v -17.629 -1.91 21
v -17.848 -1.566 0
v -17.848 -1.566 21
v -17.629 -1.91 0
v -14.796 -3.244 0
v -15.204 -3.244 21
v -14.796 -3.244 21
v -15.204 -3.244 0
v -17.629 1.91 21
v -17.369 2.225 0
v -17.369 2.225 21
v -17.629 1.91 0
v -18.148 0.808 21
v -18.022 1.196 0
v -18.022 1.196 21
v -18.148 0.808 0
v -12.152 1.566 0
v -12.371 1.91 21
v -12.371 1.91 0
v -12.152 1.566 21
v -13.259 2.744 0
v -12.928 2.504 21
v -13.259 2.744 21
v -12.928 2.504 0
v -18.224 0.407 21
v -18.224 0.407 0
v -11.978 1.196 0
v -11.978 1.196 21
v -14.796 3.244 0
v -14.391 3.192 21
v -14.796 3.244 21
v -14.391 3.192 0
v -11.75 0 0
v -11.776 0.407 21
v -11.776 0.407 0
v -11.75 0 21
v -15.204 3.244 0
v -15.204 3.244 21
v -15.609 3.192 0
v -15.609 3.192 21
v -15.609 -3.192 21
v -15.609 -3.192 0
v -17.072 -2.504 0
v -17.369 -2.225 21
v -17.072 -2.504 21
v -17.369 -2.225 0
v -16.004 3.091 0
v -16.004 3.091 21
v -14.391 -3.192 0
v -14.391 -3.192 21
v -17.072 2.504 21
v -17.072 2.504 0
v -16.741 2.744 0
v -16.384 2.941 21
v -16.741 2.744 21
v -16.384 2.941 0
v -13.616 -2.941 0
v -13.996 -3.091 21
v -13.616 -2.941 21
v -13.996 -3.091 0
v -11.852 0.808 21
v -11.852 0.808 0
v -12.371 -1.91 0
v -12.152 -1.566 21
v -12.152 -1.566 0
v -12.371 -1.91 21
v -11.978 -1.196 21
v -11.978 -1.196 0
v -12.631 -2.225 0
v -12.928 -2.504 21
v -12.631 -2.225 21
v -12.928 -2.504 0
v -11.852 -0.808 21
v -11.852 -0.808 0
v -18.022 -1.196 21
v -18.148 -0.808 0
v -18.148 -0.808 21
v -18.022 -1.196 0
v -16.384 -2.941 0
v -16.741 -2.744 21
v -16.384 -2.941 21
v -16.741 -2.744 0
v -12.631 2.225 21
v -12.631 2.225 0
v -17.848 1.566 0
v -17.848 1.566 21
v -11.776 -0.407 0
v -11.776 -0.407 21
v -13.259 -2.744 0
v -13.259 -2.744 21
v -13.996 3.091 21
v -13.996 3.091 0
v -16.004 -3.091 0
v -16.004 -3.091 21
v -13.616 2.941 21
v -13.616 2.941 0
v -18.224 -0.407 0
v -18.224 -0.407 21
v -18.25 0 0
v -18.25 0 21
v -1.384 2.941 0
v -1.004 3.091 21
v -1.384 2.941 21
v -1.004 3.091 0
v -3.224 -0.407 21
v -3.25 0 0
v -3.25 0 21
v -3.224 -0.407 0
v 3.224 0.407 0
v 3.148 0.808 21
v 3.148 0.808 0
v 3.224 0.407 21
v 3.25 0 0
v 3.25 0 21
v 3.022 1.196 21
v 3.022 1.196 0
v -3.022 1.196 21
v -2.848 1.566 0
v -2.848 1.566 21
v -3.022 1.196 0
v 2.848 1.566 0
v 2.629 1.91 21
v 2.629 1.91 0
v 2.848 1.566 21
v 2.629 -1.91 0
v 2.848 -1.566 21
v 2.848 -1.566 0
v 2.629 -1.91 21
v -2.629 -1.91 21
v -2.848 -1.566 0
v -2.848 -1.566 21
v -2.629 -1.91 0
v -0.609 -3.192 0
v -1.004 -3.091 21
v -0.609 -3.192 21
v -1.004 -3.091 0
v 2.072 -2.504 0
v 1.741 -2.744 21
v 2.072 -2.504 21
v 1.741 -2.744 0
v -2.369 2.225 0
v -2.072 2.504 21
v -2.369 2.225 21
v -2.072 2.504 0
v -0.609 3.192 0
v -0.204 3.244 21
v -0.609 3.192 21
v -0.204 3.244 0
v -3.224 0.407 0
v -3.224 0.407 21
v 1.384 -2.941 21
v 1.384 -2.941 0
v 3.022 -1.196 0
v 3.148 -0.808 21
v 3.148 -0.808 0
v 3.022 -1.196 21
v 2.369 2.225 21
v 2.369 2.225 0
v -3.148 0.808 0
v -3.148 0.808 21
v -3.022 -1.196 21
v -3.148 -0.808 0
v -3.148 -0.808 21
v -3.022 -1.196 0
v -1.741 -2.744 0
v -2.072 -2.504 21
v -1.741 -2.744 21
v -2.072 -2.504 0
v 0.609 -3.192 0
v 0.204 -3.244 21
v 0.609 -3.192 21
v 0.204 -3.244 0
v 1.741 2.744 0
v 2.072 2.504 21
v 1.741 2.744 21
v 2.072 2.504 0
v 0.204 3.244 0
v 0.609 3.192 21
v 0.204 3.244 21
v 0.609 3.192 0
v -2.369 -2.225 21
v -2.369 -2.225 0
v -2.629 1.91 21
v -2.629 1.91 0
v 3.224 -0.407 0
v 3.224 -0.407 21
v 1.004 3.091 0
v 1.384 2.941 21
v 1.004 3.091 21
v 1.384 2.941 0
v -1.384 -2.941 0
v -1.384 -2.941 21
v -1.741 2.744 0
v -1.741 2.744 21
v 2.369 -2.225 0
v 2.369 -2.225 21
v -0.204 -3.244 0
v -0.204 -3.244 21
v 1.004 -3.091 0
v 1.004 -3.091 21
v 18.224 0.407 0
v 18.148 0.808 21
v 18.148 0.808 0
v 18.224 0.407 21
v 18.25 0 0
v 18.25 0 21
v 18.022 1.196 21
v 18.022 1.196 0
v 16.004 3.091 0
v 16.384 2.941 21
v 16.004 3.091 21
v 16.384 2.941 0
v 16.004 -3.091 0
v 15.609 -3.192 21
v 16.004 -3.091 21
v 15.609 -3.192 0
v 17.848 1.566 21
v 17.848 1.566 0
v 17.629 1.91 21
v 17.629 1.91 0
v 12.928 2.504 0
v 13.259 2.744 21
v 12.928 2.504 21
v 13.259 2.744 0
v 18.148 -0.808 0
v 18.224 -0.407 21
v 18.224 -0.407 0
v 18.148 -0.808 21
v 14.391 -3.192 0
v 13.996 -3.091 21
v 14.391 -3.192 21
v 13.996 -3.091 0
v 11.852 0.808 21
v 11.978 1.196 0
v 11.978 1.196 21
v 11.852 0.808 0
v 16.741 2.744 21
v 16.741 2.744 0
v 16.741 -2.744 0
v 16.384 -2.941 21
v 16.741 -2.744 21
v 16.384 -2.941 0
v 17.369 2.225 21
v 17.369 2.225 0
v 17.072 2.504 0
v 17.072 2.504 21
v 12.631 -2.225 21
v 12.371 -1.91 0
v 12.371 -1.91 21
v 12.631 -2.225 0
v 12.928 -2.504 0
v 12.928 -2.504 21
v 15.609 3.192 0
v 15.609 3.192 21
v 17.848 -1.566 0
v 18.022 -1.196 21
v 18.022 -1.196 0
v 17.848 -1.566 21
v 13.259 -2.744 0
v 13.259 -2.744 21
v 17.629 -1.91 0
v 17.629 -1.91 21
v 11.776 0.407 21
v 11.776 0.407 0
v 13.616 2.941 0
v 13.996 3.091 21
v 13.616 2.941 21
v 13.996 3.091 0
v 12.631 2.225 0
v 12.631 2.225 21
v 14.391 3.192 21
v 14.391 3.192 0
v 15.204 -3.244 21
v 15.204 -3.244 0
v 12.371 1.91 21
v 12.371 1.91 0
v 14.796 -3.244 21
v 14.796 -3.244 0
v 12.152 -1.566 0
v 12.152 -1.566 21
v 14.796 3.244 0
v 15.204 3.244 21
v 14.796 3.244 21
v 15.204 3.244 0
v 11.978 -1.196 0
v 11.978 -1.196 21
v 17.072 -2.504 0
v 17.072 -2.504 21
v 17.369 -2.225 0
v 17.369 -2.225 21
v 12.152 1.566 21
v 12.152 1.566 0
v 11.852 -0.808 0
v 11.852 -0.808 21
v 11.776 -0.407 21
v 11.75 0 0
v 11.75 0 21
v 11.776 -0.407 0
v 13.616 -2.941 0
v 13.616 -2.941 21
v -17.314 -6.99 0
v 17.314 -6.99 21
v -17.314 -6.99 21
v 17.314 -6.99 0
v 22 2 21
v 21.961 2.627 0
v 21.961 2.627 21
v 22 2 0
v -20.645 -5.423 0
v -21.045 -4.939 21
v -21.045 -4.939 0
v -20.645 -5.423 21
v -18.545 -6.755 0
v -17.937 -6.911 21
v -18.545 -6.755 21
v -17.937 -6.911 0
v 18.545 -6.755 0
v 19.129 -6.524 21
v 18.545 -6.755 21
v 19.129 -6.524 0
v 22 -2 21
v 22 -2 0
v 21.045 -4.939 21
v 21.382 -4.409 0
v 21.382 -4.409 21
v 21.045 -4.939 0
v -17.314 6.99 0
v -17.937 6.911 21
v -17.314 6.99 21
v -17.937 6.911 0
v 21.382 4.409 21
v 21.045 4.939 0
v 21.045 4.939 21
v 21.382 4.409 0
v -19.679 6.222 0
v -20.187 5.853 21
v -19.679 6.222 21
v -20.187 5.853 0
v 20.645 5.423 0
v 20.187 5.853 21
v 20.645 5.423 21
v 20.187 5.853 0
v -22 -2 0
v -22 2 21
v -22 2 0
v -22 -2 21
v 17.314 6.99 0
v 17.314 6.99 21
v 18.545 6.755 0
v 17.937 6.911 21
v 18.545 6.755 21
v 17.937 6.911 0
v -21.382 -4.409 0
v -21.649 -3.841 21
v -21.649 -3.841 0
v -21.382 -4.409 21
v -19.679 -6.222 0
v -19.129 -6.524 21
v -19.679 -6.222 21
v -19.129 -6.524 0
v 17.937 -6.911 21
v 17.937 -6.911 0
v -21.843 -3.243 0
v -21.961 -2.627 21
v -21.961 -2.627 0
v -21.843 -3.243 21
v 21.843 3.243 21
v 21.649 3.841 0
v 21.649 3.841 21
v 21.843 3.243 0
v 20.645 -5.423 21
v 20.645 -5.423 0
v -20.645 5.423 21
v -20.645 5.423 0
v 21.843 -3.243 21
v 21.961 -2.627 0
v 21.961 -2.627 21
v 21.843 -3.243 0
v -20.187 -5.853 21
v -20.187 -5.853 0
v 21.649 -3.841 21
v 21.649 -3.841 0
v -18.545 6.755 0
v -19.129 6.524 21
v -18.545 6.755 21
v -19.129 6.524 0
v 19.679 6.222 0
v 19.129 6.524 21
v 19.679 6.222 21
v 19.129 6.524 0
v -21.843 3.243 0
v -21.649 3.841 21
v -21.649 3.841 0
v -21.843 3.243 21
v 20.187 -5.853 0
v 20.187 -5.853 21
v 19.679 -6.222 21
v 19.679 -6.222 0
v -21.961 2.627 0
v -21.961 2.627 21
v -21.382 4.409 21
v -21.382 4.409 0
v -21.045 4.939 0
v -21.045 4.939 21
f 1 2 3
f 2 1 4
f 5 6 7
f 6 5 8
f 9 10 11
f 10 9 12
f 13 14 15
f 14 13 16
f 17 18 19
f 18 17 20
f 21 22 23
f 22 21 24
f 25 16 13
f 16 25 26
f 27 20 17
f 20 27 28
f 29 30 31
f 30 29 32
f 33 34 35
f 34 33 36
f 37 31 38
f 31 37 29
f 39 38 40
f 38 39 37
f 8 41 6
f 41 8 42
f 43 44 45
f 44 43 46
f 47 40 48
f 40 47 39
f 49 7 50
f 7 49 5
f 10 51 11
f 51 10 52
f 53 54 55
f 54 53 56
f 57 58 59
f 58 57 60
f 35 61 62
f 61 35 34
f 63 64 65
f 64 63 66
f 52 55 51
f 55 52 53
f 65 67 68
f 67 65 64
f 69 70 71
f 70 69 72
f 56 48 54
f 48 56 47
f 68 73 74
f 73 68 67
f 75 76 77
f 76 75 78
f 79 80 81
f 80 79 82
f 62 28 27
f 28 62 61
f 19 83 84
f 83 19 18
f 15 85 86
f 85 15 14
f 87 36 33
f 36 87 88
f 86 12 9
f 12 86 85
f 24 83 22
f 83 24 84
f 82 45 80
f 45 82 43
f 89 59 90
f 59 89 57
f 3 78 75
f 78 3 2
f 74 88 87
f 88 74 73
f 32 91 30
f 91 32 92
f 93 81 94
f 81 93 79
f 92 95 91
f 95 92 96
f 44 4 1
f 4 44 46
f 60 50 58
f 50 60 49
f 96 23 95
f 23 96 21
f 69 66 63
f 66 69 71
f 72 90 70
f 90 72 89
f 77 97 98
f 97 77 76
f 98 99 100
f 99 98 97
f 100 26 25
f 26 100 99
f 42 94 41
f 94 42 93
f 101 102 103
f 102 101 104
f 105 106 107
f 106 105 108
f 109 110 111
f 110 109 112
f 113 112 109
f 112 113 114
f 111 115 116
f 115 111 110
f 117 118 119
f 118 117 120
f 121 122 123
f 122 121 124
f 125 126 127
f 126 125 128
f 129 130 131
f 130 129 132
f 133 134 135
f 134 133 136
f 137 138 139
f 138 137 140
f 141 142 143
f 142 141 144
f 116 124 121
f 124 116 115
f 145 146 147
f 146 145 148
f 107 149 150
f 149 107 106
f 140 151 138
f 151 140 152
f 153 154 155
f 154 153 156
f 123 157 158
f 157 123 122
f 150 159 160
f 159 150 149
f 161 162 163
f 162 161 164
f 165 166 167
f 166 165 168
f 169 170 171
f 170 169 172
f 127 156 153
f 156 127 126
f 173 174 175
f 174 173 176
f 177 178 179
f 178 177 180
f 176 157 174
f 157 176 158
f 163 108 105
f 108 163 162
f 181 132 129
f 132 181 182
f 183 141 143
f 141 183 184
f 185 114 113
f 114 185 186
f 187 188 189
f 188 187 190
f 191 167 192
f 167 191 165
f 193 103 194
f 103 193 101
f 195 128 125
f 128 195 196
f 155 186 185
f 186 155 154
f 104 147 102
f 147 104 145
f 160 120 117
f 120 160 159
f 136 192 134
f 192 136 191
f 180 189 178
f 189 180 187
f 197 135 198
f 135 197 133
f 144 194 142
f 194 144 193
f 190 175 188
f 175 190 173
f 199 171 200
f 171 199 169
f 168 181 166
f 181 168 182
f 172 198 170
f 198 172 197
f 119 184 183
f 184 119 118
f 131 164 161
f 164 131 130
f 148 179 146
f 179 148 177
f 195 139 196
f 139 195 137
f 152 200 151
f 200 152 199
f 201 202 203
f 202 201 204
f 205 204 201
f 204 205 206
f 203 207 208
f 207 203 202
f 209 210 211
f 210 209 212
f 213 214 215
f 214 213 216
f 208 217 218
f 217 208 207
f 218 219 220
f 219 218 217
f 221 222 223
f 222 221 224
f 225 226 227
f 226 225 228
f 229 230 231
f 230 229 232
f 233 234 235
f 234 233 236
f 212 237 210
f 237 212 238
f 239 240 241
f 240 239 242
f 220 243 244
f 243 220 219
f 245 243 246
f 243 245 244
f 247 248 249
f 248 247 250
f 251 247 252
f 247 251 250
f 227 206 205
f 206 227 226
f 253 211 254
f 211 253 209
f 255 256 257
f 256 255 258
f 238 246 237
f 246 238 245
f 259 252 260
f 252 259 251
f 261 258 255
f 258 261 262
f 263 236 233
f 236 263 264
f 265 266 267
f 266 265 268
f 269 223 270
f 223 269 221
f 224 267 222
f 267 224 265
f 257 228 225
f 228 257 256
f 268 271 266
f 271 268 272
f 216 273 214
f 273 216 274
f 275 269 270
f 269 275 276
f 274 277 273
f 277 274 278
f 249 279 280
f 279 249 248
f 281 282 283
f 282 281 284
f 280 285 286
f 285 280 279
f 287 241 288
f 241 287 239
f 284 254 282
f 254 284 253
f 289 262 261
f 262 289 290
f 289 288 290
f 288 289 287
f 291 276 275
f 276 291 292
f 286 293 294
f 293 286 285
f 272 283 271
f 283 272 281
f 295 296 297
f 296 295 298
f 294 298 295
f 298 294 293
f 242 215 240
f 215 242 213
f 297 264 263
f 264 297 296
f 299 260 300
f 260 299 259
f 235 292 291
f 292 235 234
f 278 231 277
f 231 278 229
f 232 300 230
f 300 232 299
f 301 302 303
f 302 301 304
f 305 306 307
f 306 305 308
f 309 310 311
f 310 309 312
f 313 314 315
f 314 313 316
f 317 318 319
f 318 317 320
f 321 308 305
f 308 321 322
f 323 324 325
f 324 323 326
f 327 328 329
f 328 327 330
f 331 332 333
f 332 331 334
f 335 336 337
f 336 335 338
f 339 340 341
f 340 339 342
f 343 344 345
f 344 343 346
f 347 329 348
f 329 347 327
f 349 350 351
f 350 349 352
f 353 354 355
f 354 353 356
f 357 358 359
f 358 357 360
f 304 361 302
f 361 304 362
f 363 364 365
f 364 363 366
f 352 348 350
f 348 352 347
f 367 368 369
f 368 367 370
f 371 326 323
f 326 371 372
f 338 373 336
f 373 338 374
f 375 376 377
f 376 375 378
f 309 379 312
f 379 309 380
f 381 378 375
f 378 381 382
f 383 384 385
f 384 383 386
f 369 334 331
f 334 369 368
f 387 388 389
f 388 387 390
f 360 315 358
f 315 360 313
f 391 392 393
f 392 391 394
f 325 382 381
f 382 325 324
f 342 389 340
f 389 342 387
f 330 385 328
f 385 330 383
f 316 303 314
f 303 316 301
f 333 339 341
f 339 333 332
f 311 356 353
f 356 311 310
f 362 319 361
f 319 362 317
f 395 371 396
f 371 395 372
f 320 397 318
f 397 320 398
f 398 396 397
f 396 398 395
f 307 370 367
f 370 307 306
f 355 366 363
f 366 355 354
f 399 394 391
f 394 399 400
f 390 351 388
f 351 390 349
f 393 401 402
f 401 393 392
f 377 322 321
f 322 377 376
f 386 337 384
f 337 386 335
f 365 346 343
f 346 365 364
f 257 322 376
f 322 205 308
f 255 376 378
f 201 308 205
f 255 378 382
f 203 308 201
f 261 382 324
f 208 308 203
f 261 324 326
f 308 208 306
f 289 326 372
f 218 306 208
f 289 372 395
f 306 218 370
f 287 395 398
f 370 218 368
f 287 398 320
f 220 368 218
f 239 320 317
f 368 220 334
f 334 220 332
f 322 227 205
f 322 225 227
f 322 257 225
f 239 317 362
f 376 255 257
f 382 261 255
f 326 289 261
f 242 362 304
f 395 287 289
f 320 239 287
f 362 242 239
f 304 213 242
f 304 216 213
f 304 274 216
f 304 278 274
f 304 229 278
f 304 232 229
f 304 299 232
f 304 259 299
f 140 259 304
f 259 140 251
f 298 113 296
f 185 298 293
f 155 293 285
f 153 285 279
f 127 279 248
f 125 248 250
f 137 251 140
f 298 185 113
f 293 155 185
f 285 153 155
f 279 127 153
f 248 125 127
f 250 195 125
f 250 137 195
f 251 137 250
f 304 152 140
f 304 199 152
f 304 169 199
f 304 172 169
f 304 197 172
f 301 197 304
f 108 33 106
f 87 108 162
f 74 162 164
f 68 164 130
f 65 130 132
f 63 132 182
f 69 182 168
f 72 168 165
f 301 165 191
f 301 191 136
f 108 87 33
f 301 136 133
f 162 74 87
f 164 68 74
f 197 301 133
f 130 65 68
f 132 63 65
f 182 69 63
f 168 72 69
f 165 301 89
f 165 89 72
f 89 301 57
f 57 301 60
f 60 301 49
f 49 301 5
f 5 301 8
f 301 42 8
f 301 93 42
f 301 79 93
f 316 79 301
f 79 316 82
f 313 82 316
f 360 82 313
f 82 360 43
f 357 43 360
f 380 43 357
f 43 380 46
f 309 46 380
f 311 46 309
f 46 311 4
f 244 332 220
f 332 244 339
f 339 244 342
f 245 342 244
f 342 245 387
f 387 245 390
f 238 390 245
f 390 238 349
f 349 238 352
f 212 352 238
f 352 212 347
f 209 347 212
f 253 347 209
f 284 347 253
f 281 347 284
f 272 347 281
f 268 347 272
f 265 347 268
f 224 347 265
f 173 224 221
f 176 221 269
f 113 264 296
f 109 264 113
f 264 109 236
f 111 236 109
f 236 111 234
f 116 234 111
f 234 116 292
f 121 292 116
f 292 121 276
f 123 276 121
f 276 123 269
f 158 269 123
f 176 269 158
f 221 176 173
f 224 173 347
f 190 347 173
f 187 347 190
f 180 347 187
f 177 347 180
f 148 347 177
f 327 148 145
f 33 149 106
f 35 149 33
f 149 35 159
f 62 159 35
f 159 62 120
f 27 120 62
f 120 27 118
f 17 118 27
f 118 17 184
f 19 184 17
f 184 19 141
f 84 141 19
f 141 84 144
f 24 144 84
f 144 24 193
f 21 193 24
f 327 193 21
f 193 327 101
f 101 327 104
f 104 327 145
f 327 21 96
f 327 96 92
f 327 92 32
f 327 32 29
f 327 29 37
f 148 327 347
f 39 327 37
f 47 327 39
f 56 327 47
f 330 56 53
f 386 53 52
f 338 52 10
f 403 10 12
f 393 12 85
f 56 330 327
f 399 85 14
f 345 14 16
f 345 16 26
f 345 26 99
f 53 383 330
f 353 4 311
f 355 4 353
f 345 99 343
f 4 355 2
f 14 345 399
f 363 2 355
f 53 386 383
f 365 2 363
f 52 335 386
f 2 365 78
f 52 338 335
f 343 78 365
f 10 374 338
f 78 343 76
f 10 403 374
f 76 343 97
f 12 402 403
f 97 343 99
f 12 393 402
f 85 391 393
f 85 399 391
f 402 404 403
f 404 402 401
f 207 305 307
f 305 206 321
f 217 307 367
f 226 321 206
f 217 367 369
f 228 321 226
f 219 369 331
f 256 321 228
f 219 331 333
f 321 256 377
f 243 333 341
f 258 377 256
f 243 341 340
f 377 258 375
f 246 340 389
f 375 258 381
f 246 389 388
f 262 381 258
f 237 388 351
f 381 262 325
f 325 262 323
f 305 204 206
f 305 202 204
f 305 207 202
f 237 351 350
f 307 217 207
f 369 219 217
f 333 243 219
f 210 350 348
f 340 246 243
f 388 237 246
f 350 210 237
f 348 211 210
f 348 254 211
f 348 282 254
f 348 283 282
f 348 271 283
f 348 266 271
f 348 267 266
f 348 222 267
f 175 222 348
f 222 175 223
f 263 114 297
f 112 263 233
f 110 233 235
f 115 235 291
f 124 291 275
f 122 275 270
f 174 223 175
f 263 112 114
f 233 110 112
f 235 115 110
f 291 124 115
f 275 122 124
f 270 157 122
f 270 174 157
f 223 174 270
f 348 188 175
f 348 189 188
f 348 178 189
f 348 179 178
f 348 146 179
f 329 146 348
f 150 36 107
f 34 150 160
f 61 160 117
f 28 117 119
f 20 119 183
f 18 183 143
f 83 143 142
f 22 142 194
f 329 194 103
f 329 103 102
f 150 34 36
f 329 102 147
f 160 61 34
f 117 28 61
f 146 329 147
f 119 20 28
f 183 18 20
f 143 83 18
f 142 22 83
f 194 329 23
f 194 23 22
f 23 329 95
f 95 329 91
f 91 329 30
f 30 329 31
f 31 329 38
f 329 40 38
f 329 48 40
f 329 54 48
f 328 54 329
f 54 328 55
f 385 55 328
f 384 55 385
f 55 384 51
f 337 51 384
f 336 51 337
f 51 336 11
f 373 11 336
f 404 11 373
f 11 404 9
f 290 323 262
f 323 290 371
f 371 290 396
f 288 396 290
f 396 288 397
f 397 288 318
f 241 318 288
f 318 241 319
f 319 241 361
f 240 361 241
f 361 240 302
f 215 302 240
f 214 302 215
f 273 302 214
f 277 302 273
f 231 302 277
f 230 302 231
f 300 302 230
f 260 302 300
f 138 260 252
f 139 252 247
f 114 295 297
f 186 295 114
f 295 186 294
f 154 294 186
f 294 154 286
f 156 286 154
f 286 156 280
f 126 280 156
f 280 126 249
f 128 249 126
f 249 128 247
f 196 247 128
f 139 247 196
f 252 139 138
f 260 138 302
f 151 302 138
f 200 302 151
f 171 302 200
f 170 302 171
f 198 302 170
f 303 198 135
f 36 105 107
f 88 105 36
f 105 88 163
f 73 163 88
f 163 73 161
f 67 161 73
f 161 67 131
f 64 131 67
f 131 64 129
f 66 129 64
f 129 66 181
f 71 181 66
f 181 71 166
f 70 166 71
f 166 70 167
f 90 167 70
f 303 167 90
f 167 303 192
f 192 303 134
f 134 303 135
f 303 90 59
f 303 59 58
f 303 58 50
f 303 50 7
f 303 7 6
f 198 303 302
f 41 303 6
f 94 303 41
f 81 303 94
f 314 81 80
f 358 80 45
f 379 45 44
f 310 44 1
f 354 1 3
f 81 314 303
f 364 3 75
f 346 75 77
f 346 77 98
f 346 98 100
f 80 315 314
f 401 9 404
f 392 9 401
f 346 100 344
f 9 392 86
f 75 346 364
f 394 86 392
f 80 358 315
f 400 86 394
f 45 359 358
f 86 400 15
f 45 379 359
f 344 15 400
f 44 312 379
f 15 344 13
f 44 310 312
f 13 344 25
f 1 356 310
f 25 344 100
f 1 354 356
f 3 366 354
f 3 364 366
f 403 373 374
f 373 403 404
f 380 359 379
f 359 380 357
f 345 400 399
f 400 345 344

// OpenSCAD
$fn = 50;


difference() {
	union() {
		hull() {
			translate(v = [-17.0000000000, 2.0000000000, 0]) {
				cylinder(h = 21, r = 5);
			}
			translate(v = [17.0000000000, 2.0000000000, 0]) {
				cylinder(h = 21, r = 5);
			}
			translate(v = [-17.0000000000, -2.0000000000, 0]) {
				cylinder(h = 21, r = 5);
			}
			translate(v = [17.0000000000, -2.0000000000, 0]) {
				cylinder(h = 21, r = 5);
			}
		}
	}
	union() {
		translate(v = [-15.0000000000, 0.0000000000, 0]) {
			translate(v = [0, 0, -100]) {
				cylinder(h = 200, r = 3.2500000000);
			}
		}
		translate(v = [0, 0, -100]) {
			cylinder(h = 200, r = 3.2500000000);
		}
		translate(v = [15.0000000000, 0.0000000000, 0]) {
			translate(v = [0, 0, -100]) {
				cylinder(h = 200, r = 3.2500000000);
			}
		}
	}
}
